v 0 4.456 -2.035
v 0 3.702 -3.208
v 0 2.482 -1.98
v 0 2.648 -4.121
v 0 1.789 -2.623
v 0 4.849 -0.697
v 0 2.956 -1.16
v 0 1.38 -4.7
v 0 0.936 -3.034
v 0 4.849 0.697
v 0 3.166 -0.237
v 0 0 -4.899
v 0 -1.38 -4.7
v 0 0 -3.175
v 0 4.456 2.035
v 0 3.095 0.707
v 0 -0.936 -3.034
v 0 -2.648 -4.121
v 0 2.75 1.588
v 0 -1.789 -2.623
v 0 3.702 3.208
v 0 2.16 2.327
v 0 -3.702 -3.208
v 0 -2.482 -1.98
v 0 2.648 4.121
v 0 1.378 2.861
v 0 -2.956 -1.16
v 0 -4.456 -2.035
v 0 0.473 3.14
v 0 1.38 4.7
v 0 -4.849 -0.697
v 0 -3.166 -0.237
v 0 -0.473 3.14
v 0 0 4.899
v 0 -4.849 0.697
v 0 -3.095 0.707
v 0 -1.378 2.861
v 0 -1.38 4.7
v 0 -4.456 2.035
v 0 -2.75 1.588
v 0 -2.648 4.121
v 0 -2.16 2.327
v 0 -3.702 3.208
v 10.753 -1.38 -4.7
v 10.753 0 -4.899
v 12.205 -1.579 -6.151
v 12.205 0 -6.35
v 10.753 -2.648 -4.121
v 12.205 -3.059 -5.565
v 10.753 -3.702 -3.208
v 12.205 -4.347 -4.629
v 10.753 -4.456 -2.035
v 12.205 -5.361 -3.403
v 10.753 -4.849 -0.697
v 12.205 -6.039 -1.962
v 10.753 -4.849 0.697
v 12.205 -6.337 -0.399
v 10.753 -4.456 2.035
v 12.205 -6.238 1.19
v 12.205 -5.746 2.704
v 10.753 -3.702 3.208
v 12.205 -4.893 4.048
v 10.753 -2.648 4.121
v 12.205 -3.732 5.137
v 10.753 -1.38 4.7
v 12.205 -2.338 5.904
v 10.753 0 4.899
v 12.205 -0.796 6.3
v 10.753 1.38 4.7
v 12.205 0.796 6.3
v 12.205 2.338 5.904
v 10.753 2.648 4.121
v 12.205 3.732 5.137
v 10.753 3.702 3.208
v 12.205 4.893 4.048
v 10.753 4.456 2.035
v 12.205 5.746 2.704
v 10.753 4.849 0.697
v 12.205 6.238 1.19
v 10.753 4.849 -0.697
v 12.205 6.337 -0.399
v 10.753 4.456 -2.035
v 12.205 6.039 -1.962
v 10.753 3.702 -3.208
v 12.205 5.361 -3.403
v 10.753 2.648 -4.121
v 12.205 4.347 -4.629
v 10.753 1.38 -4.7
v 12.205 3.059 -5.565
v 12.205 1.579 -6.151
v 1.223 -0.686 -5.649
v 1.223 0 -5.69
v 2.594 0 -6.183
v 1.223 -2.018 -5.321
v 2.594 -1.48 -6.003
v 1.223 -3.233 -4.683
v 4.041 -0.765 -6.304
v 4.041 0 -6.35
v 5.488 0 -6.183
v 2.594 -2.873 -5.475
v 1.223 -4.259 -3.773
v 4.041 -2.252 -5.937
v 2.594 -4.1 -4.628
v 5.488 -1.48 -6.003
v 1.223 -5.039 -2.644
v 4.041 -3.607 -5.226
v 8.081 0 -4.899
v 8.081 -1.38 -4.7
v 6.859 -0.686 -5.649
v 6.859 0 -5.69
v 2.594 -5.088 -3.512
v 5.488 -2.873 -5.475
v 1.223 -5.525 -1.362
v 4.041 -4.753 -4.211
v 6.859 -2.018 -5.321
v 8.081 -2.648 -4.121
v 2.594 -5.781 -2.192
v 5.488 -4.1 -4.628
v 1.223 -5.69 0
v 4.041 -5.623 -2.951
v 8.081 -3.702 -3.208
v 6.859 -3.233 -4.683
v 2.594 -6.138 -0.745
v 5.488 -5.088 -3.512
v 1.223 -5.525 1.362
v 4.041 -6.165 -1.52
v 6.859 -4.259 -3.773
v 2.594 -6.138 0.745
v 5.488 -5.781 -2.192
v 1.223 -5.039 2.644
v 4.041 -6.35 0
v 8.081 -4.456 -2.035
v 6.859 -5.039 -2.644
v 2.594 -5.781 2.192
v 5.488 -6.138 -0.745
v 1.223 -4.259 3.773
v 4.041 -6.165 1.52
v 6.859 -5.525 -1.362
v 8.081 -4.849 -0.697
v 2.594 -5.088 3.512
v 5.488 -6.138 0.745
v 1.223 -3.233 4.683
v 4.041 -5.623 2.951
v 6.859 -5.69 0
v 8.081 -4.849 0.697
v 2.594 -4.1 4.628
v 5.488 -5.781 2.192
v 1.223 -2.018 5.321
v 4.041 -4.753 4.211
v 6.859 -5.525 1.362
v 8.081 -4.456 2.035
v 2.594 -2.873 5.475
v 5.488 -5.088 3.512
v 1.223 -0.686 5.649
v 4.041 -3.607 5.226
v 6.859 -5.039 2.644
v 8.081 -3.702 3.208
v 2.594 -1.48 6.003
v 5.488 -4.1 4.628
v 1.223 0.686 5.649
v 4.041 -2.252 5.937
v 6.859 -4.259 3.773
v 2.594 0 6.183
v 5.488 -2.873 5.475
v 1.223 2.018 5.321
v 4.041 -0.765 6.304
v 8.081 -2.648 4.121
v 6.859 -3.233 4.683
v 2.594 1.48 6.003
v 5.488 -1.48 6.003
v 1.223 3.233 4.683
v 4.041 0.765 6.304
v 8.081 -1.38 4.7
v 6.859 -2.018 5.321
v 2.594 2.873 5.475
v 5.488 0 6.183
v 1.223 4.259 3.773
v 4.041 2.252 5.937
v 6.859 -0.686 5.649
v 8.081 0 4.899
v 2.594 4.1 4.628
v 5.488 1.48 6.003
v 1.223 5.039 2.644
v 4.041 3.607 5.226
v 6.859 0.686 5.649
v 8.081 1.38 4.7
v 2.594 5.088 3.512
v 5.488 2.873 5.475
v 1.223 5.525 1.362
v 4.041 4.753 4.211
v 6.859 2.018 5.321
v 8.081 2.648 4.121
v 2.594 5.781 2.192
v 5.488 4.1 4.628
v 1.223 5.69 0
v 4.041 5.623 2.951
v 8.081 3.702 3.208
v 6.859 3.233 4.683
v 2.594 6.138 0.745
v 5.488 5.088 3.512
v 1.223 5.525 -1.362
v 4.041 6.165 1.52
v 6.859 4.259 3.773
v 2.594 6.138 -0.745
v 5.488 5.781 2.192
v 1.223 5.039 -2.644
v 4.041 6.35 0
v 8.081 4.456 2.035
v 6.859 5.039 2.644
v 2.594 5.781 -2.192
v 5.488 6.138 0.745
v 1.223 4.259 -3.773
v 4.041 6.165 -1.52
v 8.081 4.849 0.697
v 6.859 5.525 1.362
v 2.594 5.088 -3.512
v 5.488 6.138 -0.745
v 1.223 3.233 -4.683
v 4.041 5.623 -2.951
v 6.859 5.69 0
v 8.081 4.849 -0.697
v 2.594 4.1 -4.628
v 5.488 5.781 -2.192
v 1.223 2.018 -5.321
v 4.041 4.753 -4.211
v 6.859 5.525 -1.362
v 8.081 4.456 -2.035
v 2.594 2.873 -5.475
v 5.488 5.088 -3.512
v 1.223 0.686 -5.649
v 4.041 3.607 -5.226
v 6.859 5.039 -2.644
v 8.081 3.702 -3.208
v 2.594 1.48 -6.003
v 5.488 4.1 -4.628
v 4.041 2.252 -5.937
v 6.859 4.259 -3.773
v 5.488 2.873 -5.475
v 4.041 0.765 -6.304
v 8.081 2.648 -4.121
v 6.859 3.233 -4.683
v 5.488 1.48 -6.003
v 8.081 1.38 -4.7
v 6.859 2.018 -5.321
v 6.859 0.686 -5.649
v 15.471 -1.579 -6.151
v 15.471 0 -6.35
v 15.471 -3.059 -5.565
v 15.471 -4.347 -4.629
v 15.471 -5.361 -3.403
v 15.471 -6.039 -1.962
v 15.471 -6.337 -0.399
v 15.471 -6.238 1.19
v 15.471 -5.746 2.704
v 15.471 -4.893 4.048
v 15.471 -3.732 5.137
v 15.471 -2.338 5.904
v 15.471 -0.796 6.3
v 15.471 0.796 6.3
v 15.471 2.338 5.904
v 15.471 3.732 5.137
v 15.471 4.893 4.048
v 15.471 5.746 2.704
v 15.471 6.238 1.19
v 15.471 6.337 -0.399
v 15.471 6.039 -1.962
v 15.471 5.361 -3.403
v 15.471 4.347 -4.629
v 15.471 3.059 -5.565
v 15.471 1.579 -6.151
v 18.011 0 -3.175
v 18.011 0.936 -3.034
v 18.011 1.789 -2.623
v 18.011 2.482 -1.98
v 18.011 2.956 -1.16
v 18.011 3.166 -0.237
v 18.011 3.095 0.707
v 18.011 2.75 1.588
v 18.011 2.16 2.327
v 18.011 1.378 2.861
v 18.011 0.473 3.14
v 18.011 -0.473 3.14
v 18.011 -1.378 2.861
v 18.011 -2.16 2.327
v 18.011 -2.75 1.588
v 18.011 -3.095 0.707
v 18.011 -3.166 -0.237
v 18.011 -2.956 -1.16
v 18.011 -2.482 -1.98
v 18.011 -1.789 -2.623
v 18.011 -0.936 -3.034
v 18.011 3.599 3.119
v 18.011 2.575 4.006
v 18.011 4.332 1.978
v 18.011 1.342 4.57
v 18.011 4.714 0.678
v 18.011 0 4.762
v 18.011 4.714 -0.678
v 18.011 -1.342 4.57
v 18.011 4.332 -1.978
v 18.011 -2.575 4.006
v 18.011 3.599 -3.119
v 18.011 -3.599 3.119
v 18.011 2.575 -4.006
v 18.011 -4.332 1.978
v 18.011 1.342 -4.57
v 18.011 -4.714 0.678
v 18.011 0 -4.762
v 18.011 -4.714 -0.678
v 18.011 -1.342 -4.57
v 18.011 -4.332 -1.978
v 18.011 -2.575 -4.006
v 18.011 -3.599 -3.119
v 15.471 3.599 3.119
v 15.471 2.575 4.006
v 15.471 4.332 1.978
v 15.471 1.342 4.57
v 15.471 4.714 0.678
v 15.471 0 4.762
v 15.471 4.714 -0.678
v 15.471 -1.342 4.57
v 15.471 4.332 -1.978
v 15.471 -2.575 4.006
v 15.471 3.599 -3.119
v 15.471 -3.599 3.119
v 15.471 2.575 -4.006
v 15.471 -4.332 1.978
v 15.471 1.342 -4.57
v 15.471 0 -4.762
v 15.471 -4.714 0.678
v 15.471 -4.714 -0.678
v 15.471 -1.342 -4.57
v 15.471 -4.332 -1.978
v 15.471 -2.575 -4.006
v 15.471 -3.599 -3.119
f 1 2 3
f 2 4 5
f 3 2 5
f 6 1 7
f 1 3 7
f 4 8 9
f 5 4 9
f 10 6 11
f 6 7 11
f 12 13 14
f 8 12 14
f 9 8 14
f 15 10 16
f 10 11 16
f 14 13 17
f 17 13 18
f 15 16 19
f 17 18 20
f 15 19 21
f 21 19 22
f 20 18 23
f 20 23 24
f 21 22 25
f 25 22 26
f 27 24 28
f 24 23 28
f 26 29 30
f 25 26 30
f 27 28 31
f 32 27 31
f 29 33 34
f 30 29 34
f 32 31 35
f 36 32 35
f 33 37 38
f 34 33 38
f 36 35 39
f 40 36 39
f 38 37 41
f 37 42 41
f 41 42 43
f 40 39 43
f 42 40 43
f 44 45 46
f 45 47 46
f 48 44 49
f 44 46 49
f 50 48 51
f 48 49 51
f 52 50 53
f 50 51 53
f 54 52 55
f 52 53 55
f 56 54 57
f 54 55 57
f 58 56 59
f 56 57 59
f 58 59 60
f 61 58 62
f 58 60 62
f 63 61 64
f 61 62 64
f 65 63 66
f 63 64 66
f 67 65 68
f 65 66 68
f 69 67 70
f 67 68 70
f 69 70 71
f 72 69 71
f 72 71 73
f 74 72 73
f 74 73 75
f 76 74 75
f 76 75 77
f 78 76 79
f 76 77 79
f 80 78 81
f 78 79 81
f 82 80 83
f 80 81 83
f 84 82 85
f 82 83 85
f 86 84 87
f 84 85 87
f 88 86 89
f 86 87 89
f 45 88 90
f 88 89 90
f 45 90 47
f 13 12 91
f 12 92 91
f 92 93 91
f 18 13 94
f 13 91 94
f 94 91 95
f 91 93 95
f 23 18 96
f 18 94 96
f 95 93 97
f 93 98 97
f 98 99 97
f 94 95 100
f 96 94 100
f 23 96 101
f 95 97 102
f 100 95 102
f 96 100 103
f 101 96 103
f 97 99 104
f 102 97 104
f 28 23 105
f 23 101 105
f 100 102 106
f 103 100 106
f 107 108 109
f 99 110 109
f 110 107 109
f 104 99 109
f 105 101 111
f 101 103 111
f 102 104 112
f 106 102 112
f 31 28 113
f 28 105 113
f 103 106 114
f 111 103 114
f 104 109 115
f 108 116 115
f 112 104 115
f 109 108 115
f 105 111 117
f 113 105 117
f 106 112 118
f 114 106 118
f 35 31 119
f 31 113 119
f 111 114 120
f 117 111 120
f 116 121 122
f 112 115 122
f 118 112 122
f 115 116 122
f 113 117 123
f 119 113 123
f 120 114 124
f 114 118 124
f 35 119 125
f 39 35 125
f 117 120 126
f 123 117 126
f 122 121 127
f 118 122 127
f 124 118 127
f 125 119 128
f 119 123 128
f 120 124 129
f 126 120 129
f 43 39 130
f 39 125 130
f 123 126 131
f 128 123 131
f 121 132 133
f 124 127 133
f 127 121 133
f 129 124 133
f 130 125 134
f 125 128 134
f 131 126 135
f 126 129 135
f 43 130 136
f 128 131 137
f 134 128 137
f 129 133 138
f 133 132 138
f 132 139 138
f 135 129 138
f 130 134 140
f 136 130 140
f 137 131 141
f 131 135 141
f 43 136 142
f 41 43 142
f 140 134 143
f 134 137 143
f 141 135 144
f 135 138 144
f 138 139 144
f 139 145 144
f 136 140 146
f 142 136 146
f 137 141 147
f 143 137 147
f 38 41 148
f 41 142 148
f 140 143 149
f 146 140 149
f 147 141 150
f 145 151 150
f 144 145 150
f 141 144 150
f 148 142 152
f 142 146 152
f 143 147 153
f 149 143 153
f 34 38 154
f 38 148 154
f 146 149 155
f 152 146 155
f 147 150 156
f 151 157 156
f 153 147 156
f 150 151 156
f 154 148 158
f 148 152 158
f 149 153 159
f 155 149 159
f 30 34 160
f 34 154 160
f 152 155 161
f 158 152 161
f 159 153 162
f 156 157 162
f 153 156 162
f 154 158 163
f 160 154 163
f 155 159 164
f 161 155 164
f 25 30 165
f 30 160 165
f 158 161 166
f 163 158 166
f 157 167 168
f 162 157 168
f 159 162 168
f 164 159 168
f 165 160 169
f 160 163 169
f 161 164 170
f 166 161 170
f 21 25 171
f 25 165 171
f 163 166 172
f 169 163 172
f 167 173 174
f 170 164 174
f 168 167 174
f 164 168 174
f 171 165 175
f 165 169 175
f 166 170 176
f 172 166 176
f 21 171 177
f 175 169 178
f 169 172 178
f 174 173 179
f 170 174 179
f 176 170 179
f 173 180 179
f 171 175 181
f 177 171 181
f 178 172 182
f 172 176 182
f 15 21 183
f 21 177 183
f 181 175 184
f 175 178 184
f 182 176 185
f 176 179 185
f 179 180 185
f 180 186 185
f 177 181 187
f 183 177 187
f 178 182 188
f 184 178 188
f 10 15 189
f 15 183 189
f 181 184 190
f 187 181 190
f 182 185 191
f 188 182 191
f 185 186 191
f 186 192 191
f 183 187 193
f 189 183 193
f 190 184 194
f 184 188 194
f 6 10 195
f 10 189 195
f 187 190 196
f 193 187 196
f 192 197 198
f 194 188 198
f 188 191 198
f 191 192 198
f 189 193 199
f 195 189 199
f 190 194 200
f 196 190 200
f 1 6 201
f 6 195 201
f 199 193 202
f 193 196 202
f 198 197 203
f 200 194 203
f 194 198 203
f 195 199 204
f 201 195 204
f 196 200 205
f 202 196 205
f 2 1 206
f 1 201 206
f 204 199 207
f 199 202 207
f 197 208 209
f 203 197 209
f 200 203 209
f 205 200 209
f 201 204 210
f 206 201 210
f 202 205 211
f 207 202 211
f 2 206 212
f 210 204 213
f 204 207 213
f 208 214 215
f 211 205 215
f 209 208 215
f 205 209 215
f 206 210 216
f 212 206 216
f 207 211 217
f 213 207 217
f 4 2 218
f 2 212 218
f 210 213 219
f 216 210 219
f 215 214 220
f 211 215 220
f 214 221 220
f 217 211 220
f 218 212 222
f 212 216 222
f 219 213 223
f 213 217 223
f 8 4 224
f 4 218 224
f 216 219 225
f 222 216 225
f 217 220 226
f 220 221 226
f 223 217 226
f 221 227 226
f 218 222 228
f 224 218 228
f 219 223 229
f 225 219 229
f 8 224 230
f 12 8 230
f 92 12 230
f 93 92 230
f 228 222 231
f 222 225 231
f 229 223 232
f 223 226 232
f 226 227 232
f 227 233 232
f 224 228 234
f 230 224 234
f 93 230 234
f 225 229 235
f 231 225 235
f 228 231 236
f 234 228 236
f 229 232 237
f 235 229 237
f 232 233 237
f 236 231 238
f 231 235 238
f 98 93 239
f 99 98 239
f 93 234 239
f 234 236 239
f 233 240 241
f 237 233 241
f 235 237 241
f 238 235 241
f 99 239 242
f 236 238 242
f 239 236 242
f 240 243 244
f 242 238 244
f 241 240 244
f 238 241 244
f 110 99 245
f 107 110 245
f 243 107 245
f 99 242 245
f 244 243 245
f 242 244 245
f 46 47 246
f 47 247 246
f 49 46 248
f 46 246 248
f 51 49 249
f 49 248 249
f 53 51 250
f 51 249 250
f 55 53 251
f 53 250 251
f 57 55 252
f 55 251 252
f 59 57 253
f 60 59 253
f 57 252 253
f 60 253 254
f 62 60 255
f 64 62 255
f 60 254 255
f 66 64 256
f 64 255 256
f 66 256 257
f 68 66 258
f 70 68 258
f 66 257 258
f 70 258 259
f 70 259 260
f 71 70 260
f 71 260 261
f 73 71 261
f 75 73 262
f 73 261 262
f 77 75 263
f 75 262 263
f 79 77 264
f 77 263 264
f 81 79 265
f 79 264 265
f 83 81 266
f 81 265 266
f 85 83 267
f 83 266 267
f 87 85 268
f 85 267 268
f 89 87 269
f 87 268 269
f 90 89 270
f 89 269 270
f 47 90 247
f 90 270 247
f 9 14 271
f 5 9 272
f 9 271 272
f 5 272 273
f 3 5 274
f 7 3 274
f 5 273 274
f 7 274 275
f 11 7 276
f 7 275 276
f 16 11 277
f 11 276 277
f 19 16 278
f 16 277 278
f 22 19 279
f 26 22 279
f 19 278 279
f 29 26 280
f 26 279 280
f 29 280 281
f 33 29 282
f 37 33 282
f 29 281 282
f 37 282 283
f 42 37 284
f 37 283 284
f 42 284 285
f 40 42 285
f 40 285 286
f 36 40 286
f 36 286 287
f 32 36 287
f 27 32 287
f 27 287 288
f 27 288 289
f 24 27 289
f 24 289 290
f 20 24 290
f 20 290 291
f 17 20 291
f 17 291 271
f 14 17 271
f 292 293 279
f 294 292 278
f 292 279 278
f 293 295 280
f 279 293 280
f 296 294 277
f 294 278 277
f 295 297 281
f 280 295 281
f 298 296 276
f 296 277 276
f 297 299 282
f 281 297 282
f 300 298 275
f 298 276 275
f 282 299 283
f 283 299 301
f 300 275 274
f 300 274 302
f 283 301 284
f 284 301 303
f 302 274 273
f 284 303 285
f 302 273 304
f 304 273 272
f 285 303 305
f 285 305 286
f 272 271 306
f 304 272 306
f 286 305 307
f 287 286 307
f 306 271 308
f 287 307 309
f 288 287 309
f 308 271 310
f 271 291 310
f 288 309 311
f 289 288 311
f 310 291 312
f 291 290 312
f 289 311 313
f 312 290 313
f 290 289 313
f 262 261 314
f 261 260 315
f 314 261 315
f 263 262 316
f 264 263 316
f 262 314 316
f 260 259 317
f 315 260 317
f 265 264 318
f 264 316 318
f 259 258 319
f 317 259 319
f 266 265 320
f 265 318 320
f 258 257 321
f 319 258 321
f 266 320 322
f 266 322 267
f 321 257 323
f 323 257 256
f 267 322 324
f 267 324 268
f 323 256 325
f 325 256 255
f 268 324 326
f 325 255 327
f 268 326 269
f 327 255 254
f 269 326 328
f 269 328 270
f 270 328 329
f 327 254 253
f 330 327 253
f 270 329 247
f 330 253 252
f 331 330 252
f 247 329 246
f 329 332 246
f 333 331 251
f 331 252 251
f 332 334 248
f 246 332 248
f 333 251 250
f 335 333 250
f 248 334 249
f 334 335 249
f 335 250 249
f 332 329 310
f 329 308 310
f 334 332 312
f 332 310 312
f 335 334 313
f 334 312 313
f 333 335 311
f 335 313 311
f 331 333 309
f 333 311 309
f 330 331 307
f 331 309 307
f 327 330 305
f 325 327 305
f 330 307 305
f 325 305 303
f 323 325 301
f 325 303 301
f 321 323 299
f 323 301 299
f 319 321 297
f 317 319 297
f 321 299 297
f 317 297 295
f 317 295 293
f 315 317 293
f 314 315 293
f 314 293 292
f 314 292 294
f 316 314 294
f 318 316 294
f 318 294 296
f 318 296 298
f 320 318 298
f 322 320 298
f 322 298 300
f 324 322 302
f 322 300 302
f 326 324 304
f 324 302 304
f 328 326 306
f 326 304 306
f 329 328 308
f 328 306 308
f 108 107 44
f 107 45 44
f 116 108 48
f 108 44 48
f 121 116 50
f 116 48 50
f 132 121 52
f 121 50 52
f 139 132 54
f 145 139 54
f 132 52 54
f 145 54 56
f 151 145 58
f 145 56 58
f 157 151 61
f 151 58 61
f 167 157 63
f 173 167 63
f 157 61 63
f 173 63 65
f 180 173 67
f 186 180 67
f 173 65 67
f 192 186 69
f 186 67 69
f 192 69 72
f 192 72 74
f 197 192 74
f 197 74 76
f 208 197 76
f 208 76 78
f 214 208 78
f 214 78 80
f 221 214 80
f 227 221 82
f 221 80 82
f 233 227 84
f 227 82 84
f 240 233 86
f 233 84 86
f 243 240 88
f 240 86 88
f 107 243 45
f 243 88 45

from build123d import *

# Parameters (mm, degrees)
F_1_4_0_25_DIAMETER_HOLE1_D = 6.35


with BuildPart() as part:
    # Sketch1 → Revolve1 (revolve)
    with BuildSketch(Plane.XY):
        with BuildLine():
            Line((0, 0), (0, 4.89857161))
            ThreePointArc((0, 4.89857161), (4.040605918, 6.35), (8.081211835, 4.89857161))
            Line((8.081211835, 4.89857161), (10.753463242, 4.89857161))
            Line((10.753463242, 4.89857161), (12.204891632, 6.35))
            Line((12.204891632, 6.35), (15.470605918, 6.35))
            Line((15.470605918, 6.35), (15.470605918, 4.7625))
            Line((15.470605918, 4.7625), (18.010605918, 4.7625))
            Line((18.010605918, 4.7625), (18.010605918, 0))
            Line((18.010605918, 0), (0, 0))
        make_face()
    revolve(axis=Axis((18.010605918, 0, 0), (-1, 0, 0)))

    # 1/4 (0.25) Diameter Hole1 (through all)
    with Locations(Plane.ZY):
        with Locations((0, 0)):
            Hole(F_1_4_0_25_DIAMETER_HOLE1_D / 2)


solid = part.part
